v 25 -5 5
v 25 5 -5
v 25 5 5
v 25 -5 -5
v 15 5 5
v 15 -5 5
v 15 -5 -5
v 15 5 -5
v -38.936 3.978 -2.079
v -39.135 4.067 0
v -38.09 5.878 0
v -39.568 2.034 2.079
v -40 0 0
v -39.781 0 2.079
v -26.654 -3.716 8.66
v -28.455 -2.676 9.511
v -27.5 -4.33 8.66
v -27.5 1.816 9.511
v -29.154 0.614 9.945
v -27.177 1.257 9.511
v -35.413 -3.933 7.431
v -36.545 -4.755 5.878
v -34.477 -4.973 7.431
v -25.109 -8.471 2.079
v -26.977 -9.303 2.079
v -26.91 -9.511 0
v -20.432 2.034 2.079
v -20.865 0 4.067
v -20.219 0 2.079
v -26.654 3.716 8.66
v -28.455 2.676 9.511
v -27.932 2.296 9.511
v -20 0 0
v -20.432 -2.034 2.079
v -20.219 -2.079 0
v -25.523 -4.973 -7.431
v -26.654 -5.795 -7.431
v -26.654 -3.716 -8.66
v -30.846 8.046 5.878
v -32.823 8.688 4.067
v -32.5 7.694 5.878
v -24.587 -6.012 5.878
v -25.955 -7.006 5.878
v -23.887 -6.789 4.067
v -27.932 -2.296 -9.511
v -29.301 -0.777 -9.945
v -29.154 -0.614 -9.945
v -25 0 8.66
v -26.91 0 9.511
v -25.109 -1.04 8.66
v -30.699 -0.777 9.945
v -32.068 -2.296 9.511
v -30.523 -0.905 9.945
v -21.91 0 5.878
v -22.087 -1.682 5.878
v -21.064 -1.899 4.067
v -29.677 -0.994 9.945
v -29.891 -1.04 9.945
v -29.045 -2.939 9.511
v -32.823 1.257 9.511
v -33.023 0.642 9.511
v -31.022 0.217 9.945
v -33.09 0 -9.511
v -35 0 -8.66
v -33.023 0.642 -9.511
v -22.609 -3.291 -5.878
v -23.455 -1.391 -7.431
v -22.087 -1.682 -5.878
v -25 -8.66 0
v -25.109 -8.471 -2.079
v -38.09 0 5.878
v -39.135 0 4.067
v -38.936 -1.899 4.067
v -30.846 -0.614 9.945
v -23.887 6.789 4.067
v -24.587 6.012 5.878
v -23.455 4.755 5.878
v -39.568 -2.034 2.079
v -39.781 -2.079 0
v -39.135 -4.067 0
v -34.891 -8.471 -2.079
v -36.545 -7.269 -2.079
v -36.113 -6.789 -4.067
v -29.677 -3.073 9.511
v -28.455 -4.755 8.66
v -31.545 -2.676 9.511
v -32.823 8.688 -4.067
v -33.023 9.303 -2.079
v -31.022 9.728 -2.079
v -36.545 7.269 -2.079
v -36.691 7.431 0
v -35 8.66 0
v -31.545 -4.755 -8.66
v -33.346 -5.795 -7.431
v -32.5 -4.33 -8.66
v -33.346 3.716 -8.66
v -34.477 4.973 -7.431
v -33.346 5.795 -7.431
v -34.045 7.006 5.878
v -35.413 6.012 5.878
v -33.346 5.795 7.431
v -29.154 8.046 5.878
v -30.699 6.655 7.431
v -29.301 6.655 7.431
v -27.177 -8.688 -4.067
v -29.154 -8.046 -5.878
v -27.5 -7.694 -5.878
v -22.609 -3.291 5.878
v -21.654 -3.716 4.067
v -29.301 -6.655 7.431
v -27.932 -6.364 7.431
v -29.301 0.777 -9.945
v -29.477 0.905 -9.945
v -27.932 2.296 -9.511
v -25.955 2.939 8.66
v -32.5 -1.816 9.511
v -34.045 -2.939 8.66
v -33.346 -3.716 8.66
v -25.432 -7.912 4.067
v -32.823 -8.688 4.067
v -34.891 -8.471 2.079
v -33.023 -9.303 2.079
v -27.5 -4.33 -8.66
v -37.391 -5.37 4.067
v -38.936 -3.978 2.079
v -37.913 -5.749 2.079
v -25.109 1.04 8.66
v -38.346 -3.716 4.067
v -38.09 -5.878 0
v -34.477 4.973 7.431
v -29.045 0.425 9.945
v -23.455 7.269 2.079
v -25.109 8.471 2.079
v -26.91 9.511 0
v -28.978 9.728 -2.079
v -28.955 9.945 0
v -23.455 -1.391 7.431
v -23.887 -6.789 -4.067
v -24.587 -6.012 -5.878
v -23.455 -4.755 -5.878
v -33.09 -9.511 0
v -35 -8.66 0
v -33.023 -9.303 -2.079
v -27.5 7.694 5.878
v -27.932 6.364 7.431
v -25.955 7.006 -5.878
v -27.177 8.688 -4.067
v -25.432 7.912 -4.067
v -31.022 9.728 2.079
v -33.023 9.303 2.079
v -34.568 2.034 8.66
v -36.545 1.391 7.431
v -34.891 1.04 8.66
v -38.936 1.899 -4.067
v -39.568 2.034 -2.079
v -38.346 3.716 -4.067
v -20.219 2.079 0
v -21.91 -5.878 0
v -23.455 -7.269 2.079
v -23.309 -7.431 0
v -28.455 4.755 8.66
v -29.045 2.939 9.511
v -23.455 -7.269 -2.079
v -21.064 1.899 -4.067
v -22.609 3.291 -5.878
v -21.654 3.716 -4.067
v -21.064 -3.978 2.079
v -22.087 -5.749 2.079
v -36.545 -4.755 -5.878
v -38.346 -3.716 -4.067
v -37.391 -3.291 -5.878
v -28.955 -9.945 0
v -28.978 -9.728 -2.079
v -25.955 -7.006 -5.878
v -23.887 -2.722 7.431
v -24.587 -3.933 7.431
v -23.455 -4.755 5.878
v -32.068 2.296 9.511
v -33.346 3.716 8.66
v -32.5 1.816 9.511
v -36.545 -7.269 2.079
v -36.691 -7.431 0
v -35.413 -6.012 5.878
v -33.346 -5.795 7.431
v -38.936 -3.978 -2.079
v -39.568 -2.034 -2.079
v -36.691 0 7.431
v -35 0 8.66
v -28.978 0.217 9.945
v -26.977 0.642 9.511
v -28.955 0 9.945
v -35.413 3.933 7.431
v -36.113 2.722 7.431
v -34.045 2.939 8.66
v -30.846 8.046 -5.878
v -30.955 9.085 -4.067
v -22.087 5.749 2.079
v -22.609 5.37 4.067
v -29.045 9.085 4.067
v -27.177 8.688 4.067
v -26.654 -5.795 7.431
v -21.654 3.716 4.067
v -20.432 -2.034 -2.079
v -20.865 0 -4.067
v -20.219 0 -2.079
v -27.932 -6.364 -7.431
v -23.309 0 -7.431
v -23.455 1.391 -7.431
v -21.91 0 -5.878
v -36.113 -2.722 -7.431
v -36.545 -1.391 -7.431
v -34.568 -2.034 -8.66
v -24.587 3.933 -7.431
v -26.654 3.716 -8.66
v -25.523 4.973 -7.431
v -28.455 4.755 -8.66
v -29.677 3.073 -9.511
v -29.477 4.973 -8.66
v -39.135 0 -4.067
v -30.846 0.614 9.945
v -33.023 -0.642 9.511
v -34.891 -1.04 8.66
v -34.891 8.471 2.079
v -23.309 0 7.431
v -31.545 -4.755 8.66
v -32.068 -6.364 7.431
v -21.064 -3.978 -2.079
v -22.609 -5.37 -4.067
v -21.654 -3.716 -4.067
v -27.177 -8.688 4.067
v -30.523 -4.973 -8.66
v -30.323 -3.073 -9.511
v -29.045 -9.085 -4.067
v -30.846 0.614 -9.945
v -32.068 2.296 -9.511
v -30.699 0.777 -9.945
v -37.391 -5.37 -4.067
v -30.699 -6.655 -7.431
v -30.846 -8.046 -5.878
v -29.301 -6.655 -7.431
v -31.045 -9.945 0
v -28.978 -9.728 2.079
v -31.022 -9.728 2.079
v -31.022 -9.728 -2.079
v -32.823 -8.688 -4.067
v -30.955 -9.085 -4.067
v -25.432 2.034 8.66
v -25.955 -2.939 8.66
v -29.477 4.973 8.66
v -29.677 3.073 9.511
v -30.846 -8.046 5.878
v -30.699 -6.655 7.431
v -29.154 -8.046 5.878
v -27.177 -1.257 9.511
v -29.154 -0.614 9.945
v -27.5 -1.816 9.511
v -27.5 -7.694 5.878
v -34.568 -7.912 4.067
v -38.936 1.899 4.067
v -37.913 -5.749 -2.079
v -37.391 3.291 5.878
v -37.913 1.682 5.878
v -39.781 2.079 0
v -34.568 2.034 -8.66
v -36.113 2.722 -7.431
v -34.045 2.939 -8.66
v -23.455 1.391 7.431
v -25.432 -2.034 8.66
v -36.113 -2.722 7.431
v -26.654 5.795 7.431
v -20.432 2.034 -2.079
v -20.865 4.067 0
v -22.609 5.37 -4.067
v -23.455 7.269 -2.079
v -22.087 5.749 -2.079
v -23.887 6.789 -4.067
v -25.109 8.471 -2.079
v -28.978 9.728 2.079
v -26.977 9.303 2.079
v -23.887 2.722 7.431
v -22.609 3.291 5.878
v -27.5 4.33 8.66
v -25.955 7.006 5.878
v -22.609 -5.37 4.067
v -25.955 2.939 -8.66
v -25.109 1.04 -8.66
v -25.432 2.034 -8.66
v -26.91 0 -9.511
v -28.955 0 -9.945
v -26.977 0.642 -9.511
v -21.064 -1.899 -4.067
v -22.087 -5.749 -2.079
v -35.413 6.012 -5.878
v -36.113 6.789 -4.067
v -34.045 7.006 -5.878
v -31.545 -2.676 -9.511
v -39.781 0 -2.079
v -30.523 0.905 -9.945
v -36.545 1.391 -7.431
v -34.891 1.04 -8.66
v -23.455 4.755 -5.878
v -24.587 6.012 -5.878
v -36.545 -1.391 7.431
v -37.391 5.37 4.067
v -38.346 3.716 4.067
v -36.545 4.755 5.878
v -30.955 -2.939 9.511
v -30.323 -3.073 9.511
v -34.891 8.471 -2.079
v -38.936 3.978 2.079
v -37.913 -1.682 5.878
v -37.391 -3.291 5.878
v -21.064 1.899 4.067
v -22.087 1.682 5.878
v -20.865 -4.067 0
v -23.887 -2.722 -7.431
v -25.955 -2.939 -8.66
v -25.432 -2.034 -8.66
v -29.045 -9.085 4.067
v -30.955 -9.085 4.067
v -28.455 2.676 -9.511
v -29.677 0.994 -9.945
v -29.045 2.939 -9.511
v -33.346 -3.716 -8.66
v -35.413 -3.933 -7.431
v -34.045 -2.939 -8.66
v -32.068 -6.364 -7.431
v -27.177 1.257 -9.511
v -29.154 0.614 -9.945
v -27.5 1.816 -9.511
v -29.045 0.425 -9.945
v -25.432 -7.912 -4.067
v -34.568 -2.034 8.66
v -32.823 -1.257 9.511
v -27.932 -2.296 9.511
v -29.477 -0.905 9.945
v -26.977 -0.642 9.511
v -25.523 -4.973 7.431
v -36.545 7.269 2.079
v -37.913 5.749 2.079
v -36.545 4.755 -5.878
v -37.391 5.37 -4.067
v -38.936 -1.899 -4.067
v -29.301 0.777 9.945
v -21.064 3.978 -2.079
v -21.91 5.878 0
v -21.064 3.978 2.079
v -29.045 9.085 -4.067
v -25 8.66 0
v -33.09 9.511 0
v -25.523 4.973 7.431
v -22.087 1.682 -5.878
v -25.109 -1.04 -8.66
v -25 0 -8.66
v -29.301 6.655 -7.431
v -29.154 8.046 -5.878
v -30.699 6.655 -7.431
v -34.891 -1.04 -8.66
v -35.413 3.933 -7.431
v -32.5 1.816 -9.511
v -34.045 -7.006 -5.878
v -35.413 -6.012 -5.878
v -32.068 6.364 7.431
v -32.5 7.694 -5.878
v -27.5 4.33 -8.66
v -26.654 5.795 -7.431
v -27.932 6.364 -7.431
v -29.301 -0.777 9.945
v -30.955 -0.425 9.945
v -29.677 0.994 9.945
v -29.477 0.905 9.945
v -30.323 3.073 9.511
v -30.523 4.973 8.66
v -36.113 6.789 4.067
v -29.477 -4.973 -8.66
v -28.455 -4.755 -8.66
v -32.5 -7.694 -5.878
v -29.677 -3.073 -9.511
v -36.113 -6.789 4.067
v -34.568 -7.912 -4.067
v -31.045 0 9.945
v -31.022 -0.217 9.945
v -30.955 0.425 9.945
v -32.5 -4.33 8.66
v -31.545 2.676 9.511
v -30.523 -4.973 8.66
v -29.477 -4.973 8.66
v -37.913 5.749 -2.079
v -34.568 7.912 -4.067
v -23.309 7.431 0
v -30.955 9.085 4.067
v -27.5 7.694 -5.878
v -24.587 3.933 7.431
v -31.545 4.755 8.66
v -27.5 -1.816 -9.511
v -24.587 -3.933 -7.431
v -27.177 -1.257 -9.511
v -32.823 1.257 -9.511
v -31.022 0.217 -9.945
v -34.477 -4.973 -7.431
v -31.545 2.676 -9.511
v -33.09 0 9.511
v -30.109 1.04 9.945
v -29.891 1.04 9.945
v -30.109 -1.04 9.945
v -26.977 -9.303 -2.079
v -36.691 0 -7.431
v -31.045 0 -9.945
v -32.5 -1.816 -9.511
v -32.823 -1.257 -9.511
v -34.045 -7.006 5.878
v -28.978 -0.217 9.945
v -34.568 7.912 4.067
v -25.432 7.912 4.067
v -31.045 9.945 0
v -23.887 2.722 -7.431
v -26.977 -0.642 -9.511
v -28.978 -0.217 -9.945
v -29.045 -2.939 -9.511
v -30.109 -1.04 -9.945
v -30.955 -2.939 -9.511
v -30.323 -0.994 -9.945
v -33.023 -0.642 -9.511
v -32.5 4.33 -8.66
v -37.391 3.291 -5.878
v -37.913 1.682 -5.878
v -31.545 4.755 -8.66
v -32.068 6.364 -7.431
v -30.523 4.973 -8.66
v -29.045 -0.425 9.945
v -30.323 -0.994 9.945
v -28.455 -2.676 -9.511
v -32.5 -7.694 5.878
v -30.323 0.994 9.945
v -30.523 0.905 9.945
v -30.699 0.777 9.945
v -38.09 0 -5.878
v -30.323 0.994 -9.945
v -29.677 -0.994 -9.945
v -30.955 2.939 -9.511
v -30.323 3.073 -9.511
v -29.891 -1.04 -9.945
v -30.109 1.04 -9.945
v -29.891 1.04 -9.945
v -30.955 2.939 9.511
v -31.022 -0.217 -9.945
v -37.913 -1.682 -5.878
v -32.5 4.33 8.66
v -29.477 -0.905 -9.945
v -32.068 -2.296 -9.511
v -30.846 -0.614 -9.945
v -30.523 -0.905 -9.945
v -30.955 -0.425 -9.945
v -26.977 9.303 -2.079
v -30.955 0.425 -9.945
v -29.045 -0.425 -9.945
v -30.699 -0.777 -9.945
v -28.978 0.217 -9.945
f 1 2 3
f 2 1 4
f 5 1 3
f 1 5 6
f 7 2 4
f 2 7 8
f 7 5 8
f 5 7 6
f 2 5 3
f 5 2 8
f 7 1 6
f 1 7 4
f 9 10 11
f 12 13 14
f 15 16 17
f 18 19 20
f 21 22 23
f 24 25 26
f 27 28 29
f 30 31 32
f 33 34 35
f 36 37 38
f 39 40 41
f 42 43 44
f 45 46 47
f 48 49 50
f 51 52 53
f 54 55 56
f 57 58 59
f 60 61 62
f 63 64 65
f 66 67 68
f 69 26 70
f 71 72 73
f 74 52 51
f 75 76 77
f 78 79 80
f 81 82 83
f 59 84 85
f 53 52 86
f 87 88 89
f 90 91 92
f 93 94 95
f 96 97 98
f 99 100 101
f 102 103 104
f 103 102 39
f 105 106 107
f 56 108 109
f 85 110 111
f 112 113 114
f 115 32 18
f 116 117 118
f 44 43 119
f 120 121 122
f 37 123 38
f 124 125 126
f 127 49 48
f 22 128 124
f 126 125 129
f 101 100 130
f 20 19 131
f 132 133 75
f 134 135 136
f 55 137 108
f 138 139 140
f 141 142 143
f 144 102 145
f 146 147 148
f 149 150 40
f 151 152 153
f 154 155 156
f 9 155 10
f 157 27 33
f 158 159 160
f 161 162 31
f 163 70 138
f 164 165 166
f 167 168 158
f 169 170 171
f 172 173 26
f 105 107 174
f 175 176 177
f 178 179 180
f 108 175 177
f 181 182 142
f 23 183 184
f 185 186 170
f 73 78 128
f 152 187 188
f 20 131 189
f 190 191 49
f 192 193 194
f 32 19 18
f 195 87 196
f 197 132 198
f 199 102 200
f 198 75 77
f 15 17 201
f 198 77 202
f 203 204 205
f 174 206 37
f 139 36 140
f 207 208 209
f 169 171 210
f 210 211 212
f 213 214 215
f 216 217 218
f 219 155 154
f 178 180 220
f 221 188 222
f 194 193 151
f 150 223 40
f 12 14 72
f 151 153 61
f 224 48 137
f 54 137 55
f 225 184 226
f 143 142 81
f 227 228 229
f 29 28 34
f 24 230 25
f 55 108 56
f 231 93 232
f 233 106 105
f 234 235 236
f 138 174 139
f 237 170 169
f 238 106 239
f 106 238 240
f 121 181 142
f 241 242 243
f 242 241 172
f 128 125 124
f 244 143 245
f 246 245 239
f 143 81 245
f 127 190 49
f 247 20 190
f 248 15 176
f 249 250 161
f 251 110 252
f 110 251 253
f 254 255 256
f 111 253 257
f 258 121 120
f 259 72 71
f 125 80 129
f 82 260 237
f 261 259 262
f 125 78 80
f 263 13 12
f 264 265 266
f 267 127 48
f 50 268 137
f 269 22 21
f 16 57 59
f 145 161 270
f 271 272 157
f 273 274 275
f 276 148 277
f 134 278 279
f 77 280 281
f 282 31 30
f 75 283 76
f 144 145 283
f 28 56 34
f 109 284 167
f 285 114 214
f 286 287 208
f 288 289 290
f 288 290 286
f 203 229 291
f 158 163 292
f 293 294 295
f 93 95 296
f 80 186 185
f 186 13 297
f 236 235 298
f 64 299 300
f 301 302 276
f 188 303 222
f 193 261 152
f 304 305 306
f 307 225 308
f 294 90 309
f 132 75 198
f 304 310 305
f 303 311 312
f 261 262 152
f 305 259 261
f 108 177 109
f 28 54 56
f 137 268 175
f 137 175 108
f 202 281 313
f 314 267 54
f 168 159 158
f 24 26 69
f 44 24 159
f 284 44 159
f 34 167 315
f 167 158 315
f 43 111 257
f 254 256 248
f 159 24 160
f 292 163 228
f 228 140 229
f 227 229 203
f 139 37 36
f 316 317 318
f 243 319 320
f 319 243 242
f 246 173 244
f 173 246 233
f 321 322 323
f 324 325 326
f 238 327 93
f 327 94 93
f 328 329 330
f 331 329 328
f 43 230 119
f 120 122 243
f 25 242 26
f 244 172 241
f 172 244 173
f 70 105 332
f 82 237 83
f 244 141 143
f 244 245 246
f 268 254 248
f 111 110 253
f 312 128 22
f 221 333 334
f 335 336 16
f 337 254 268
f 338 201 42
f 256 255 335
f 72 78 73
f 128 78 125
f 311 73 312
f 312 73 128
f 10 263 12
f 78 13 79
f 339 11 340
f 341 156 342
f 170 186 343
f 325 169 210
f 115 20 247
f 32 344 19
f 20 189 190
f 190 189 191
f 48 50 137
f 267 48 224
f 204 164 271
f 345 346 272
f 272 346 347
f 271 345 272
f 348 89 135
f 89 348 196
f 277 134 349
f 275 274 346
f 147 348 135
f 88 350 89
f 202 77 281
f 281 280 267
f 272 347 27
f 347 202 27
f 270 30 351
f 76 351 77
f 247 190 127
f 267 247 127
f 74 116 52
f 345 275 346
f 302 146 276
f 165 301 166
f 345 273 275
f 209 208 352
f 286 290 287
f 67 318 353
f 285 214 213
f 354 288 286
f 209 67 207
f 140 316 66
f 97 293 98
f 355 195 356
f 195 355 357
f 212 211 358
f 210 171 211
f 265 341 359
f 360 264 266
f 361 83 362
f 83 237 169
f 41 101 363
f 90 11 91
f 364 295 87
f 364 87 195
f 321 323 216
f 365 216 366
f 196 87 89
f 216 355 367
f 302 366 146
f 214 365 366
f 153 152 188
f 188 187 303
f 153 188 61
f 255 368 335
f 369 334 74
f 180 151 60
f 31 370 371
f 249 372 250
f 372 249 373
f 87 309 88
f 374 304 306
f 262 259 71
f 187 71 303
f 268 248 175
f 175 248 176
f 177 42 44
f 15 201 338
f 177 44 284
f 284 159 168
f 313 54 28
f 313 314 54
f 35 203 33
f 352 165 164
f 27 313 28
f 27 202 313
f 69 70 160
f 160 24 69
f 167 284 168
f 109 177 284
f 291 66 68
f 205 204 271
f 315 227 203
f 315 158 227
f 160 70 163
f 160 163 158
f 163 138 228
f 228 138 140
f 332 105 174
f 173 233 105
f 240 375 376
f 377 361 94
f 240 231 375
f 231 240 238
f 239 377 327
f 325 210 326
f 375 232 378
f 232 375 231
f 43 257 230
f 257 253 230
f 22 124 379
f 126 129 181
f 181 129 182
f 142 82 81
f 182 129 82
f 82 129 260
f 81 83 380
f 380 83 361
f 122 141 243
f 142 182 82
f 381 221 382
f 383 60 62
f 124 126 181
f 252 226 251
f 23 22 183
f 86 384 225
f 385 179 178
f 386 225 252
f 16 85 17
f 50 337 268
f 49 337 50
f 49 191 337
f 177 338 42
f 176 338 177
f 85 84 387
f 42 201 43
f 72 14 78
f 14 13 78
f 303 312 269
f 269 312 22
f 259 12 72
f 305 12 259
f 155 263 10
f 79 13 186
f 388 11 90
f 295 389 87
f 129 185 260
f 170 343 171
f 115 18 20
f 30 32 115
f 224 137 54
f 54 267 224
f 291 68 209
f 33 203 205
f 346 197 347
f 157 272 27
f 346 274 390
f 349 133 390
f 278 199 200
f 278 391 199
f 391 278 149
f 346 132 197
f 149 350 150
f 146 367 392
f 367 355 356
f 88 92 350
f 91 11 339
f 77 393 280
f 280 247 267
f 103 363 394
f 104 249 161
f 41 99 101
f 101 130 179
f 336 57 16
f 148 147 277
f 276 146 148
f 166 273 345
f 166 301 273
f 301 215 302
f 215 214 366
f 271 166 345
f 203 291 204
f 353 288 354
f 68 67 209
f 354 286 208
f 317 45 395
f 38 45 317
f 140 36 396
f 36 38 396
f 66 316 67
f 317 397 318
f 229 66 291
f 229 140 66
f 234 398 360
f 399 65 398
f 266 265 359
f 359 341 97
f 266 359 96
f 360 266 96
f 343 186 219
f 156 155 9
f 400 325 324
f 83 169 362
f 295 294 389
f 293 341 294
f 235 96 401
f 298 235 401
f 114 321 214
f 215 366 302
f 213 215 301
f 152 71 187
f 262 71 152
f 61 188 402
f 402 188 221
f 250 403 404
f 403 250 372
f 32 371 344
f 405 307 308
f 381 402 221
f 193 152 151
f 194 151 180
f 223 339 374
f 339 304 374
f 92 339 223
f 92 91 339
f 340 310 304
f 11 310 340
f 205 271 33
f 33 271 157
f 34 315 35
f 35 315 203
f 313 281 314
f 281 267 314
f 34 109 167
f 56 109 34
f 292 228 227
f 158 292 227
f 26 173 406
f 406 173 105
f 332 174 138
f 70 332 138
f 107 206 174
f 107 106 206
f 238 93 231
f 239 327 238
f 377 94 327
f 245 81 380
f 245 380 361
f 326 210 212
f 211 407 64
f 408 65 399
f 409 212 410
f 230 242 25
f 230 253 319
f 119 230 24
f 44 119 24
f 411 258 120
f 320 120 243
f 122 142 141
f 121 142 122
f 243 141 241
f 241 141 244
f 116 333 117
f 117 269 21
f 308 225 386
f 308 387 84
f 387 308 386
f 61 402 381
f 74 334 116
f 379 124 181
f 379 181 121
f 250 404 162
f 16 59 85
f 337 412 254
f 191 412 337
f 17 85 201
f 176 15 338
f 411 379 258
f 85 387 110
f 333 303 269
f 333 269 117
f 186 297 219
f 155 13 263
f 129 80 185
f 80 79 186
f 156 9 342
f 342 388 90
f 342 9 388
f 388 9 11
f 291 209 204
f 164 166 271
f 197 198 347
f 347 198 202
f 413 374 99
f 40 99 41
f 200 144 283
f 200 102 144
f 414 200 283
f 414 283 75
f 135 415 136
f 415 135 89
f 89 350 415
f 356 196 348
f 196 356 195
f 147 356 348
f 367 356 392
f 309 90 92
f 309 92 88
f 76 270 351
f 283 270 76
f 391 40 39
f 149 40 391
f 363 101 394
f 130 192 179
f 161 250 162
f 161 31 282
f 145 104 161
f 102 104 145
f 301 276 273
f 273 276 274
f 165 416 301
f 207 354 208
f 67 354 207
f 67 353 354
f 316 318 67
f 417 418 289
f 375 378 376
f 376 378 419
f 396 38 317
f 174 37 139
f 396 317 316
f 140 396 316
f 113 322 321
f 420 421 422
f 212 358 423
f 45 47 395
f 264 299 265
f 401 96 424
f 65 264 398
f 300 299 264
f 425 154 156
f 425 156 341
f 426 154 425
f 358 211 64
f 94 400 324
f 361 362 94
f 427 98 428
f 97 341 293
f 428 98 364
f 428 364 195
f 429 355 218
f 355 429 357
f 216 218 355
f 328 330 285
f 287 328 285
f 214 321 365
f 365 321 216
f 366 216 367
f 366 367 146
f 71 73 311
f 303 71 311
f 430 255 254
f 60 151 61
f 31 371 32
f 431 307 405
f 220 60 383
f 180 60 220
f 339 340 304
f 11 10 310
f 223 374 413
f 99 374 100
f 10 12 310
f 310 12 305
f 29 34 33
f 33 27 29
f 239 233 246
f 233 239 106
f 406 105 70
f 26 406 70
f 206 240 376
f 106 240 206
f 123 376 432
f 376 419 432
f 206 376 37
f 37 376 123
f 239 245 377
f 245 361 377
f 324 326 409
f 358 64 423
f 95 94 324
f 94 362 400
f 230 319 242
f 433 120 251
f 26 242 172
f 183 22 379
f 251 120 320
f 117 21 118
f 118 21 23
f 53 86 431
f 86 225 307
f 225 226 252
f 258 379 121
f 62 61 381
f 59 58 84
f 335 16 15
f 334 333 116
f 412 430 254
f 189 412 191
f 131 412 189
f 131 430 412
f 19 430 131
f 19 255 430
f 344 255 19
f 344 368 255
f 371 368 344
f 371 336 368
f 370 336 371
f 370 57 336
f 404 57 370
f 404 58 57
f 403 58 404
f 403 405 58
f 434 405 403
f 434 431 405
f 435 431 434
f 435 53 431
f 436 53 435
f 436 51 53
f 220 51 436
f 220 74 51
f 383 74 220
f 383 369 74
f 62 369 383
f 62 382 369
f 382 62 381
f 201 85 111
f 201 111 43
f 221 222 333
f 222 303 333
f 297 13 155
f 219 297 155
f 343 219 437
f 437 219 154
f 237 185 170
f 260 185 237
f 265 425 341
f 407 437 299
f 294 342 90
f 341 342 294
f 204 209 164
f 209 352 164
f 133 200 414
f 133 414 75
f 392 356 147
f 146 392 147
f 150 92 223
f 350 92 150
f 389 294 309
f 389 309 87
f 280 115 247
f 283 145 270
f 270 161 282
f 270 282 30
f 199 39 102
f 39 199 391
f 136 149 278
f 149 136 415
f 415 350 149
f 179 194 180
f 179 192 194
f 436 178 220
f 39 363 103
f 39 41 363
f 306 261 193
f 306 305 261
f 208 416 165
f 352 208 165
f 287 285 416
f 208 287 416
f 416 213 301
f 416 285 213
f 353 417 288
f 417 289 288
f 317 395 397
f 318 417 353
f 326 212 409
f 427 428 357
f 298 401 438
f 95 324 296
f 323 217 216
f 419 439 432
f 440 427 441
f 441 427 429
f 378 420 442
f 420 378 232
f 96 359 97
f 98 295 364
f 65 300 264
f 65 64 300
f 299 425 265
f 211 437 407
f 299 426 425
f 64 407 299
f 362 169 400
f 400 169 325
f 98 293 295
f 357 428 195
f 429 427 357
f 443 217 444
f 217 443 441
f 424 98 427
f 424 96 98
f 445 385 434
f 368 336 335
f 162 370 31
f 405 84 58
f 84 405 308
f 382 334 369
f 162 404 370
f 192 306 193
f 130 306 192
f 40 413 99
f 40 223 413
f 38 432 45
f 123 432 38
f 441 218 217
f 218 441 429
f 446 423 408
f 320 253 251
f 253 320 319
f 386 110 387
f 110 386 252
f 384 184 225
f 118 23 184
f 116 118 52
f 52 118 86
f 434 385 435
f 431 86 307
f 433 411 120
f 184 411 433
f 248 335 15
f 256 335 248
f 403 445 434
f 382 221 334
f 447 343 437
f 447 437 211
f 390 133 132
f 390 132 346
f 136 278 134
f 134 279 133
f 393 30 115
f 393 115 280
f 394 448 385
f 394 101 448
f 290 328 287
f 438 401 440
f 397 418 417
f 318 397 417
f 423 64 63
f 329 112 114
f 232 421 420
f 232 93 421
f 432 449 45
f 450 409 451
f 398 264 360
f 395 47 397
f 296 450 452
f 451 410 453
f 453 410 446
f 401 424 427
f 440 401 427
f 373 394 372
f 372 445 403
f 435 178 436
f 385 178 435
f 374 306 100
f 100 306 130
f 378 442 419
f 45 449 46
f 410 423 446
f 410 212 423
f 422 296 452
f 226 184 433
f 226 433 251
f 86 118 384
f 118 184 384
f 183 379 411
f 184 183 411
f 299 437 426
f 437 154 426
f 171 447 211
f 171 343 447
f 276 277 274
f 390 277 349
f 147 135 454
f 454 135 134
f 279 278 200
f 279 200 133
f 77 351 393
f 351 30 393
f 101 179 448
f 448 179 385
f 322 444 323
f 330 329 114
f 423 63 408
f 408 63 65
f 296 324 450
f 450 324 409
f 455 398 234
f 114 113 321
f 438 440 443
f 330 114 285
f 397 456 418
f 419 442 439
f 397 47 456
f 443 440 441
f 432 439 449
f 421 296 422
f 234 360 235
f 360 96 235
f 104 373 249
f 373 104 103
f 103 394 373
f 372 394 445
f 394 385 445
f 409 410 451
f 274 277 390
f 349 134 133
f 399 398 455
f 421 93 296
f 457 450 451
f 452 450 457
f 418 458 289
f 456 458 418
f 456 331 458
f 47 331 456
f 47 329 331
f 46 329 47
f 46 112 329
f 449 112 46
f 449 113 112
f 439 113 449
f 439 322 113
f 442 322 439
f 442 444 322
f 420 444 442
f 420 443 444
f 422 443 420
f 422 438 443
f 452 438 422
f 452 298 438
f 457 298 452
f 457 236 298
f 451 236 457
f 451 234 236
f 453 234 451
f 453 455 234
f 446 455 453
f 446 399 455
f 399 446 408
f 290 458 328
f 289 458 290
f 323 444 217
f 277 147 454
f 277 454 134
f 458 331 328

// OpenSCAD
// $fa = 1;
// $fs = 0.4;
// wheel_radius = 10;
// base_height = 10;
// top_height = 14;
// track = 35;
// wheel_width = 10;
// body_roll = 0;
// wheels_turn = 0;
// side_spheres_radius=50;
// hub_thickness=4;
// cylinder_radius=2;
// cylinder_height=2*wheel_radius;
// rotate([body_roll,0,0]) {
//     // Car body base
//     cube([60,20,base_height],center=true);
//     // Car body top
//     translate([5,0,base_height/2+top_height/2 - 0.001])
//         cube([30,20,top_height],center=true);
// }
// // Front left wheel
// translate([-20,-track/2,0])
//     rotate([0,0,wheels_turn])
//     difference() {
//         // Wheel sphere
//         sphere(r=wheel_radius);
//         // Side sphere 1
//         translate([0,side_spheres_radius + hub_thickness/2,0])
//             sphere(r=side_spheres_radius);
//         // Side sphere 2
//         translate([0,- (side_spheres_radius + hub_thickness/2),0])
//             sphere(r=side_spheres_radius);
//         // Cylinder 1
//         translate([wheel_radius/2,0,0])
//             rotate([90,0,0])
//             cylinder(h=cylinder_height,r=cylinder_radius,center=true);
//         // Cylinder 2
//         translate([0,0,wheel_radius/2])
//             rotate([90,0,0])
//             cylinder(h=cylinder_height,r=cylinder_radius,center=true);
//         // Cylinder 3
//         translate([-wheel_radius/2,0,0])
//             rotate([90,0,0])
//             cylinder(h=cylinder_height,r=cylinder_radius,center=true);
//         // Cylinder 4
//         translate([0,0,-wheel_radius/2])
//             rotate([90,0,0])
//             cylinder(h=cylinder_height,r=cylinder_radius,center=true);
// }
// // Front right wheel
// translate([-20,track/2,0])
//     rotate([0,0,wheels_turn])
//     difference() {
//         // Wheel sphere
//         sphere(r=wheel_radius);
//         // Side sphere 1
//         translate([0,side_spheres_radius + hub_thickness/2,0])
//             sphere(r=side_spheres_radius);
//         // Side sphere 2
//         translate([0,- (side_spheres_radius + hub_thickness/2),0])
//             sphere(r=side_spheres_radius);
//         // Cylinder 1
//         translate([wheel_radius/2,0,0])
//             rotate([90,0,0])
//             cylinder(h=cylinder_height,r=cylinder_radius,center=true);
//         // Cylinder 2
//         translate([0,0,wheel_radius/2])
//             rotate([90,0,0])
//             cylinder(h=cylinder_height,r=cylinder_radius,center=true);
//         // Cylinder 3
//         translate([-wheel_radius/2,0,0])
//             rotate([90,0,0])
//             cylinder(h=cylinder_height,r=cylinder_radius,center=true);
//         // Cylinder 4
//         translate([0,0,-wheel_radius/2])
//             rotate([90,0,0])
//             cylinder(h=cylinder_height,r=cylinder_radius,center=true);
// }
// // Rear left wheel
// translate([20,-track/2,0])
//     rotate([0,0,0])
//     difference() {
//         // Wheel sphere
//         sphere(r=wheel_radius);
//         // Side sphere 1
//         translate([0,side_spheres_radius + hub_thickness/2,0])
//             sphere(r=side_spheres_radius);
//         // Side sphere 2
//         translate([0,- (side_spheres_radius + hub_thickness/2),0])
//             sphere(r=side_spheres_radius);
//         // Cylinder 1
//         translate([wheel_radius/2,0,0])
//             rotate([90,0,0])
//             cylinder(h=cylinder_height,r=cylinder_radius,center=true);
//         // Cylinder 2
//         translate([0,0,wheel_radius/2])
//             rotate([90,0,0])
//             cylinder(h=cylinder_height,r=cylinder_radius,center=true);
//         // Cylinder 3
//         translate([-wheel_radius/2,0,0])
//             rotate([90,0,0])
//             cylinder(h=cylinder_height,r=cylinder_radius,center=true);
//         // Cylinder 4
//         translate([0,0,-wheel_radius/2])
//             rotate([90,0,0])
//             cylinder(h=cylinder_height,r=cylinder_radius,center=true);
// }
// // Rear right wheel
// translate([20,track/2,0])
//     rotate([0,0,0])
//     difference() {
//         // Wheel sphere
//         sphere(r=wheel_radius);
//         // Side sphere 1
//         translate([0,side_spheres_radius + hub_thickness/2,0])
//             sphere(r=side_spheres_radius);
//         // Side sphere 2
//         translate([0,- (side_spheres_radius + hub_thickness/2),0])
//             sphere(r=side_spheres_radius);
//         // Cylinder 1
//         translate([wheel_radius/2,0,0])
//             rotate([90,0,0])
//             cylinder(h=cylinder_height,r=cylinder_radius,center=true);
//         // Cylinder 2
//         translate([0,0,wheel_radius/2])
//             rotate([90,0,0])
//             cylinder(h=cylinder_height,r=cylinder_radius,center=true);
//         // Cylinder 3
//         translate([-wheel_radius/2,0,0])
//             rotate([90,0,0])
//             cylinder(h=cylinder_height,r=cylinder_radius,center=true);
//         // Cylinder 4
//         translate([0,0,-wheel_radius/2])
//             rotate([90,0,0])
//             cylinder(h=cylinder_height,r=cylinder_radius,center=true);
// }
// // Front axle
// translate([-20,0,0])
//     rotate([90,0,0])
//     cylinder(h=track,r=2,center=true);
// // Rear axle
// translate([20,0,0])
//     rotate([90,0,0])
//     cylinder(h=track,r=2,center=true);






module two(){
    translate([20,0,0])children(0);
    translate([-20,0,0])children(2);

}
two(){
    cube(10, center = true);
    translate([10,0,0])cube(10, center = true);
    translate([-10,0,0])sphere(10);
    
}
